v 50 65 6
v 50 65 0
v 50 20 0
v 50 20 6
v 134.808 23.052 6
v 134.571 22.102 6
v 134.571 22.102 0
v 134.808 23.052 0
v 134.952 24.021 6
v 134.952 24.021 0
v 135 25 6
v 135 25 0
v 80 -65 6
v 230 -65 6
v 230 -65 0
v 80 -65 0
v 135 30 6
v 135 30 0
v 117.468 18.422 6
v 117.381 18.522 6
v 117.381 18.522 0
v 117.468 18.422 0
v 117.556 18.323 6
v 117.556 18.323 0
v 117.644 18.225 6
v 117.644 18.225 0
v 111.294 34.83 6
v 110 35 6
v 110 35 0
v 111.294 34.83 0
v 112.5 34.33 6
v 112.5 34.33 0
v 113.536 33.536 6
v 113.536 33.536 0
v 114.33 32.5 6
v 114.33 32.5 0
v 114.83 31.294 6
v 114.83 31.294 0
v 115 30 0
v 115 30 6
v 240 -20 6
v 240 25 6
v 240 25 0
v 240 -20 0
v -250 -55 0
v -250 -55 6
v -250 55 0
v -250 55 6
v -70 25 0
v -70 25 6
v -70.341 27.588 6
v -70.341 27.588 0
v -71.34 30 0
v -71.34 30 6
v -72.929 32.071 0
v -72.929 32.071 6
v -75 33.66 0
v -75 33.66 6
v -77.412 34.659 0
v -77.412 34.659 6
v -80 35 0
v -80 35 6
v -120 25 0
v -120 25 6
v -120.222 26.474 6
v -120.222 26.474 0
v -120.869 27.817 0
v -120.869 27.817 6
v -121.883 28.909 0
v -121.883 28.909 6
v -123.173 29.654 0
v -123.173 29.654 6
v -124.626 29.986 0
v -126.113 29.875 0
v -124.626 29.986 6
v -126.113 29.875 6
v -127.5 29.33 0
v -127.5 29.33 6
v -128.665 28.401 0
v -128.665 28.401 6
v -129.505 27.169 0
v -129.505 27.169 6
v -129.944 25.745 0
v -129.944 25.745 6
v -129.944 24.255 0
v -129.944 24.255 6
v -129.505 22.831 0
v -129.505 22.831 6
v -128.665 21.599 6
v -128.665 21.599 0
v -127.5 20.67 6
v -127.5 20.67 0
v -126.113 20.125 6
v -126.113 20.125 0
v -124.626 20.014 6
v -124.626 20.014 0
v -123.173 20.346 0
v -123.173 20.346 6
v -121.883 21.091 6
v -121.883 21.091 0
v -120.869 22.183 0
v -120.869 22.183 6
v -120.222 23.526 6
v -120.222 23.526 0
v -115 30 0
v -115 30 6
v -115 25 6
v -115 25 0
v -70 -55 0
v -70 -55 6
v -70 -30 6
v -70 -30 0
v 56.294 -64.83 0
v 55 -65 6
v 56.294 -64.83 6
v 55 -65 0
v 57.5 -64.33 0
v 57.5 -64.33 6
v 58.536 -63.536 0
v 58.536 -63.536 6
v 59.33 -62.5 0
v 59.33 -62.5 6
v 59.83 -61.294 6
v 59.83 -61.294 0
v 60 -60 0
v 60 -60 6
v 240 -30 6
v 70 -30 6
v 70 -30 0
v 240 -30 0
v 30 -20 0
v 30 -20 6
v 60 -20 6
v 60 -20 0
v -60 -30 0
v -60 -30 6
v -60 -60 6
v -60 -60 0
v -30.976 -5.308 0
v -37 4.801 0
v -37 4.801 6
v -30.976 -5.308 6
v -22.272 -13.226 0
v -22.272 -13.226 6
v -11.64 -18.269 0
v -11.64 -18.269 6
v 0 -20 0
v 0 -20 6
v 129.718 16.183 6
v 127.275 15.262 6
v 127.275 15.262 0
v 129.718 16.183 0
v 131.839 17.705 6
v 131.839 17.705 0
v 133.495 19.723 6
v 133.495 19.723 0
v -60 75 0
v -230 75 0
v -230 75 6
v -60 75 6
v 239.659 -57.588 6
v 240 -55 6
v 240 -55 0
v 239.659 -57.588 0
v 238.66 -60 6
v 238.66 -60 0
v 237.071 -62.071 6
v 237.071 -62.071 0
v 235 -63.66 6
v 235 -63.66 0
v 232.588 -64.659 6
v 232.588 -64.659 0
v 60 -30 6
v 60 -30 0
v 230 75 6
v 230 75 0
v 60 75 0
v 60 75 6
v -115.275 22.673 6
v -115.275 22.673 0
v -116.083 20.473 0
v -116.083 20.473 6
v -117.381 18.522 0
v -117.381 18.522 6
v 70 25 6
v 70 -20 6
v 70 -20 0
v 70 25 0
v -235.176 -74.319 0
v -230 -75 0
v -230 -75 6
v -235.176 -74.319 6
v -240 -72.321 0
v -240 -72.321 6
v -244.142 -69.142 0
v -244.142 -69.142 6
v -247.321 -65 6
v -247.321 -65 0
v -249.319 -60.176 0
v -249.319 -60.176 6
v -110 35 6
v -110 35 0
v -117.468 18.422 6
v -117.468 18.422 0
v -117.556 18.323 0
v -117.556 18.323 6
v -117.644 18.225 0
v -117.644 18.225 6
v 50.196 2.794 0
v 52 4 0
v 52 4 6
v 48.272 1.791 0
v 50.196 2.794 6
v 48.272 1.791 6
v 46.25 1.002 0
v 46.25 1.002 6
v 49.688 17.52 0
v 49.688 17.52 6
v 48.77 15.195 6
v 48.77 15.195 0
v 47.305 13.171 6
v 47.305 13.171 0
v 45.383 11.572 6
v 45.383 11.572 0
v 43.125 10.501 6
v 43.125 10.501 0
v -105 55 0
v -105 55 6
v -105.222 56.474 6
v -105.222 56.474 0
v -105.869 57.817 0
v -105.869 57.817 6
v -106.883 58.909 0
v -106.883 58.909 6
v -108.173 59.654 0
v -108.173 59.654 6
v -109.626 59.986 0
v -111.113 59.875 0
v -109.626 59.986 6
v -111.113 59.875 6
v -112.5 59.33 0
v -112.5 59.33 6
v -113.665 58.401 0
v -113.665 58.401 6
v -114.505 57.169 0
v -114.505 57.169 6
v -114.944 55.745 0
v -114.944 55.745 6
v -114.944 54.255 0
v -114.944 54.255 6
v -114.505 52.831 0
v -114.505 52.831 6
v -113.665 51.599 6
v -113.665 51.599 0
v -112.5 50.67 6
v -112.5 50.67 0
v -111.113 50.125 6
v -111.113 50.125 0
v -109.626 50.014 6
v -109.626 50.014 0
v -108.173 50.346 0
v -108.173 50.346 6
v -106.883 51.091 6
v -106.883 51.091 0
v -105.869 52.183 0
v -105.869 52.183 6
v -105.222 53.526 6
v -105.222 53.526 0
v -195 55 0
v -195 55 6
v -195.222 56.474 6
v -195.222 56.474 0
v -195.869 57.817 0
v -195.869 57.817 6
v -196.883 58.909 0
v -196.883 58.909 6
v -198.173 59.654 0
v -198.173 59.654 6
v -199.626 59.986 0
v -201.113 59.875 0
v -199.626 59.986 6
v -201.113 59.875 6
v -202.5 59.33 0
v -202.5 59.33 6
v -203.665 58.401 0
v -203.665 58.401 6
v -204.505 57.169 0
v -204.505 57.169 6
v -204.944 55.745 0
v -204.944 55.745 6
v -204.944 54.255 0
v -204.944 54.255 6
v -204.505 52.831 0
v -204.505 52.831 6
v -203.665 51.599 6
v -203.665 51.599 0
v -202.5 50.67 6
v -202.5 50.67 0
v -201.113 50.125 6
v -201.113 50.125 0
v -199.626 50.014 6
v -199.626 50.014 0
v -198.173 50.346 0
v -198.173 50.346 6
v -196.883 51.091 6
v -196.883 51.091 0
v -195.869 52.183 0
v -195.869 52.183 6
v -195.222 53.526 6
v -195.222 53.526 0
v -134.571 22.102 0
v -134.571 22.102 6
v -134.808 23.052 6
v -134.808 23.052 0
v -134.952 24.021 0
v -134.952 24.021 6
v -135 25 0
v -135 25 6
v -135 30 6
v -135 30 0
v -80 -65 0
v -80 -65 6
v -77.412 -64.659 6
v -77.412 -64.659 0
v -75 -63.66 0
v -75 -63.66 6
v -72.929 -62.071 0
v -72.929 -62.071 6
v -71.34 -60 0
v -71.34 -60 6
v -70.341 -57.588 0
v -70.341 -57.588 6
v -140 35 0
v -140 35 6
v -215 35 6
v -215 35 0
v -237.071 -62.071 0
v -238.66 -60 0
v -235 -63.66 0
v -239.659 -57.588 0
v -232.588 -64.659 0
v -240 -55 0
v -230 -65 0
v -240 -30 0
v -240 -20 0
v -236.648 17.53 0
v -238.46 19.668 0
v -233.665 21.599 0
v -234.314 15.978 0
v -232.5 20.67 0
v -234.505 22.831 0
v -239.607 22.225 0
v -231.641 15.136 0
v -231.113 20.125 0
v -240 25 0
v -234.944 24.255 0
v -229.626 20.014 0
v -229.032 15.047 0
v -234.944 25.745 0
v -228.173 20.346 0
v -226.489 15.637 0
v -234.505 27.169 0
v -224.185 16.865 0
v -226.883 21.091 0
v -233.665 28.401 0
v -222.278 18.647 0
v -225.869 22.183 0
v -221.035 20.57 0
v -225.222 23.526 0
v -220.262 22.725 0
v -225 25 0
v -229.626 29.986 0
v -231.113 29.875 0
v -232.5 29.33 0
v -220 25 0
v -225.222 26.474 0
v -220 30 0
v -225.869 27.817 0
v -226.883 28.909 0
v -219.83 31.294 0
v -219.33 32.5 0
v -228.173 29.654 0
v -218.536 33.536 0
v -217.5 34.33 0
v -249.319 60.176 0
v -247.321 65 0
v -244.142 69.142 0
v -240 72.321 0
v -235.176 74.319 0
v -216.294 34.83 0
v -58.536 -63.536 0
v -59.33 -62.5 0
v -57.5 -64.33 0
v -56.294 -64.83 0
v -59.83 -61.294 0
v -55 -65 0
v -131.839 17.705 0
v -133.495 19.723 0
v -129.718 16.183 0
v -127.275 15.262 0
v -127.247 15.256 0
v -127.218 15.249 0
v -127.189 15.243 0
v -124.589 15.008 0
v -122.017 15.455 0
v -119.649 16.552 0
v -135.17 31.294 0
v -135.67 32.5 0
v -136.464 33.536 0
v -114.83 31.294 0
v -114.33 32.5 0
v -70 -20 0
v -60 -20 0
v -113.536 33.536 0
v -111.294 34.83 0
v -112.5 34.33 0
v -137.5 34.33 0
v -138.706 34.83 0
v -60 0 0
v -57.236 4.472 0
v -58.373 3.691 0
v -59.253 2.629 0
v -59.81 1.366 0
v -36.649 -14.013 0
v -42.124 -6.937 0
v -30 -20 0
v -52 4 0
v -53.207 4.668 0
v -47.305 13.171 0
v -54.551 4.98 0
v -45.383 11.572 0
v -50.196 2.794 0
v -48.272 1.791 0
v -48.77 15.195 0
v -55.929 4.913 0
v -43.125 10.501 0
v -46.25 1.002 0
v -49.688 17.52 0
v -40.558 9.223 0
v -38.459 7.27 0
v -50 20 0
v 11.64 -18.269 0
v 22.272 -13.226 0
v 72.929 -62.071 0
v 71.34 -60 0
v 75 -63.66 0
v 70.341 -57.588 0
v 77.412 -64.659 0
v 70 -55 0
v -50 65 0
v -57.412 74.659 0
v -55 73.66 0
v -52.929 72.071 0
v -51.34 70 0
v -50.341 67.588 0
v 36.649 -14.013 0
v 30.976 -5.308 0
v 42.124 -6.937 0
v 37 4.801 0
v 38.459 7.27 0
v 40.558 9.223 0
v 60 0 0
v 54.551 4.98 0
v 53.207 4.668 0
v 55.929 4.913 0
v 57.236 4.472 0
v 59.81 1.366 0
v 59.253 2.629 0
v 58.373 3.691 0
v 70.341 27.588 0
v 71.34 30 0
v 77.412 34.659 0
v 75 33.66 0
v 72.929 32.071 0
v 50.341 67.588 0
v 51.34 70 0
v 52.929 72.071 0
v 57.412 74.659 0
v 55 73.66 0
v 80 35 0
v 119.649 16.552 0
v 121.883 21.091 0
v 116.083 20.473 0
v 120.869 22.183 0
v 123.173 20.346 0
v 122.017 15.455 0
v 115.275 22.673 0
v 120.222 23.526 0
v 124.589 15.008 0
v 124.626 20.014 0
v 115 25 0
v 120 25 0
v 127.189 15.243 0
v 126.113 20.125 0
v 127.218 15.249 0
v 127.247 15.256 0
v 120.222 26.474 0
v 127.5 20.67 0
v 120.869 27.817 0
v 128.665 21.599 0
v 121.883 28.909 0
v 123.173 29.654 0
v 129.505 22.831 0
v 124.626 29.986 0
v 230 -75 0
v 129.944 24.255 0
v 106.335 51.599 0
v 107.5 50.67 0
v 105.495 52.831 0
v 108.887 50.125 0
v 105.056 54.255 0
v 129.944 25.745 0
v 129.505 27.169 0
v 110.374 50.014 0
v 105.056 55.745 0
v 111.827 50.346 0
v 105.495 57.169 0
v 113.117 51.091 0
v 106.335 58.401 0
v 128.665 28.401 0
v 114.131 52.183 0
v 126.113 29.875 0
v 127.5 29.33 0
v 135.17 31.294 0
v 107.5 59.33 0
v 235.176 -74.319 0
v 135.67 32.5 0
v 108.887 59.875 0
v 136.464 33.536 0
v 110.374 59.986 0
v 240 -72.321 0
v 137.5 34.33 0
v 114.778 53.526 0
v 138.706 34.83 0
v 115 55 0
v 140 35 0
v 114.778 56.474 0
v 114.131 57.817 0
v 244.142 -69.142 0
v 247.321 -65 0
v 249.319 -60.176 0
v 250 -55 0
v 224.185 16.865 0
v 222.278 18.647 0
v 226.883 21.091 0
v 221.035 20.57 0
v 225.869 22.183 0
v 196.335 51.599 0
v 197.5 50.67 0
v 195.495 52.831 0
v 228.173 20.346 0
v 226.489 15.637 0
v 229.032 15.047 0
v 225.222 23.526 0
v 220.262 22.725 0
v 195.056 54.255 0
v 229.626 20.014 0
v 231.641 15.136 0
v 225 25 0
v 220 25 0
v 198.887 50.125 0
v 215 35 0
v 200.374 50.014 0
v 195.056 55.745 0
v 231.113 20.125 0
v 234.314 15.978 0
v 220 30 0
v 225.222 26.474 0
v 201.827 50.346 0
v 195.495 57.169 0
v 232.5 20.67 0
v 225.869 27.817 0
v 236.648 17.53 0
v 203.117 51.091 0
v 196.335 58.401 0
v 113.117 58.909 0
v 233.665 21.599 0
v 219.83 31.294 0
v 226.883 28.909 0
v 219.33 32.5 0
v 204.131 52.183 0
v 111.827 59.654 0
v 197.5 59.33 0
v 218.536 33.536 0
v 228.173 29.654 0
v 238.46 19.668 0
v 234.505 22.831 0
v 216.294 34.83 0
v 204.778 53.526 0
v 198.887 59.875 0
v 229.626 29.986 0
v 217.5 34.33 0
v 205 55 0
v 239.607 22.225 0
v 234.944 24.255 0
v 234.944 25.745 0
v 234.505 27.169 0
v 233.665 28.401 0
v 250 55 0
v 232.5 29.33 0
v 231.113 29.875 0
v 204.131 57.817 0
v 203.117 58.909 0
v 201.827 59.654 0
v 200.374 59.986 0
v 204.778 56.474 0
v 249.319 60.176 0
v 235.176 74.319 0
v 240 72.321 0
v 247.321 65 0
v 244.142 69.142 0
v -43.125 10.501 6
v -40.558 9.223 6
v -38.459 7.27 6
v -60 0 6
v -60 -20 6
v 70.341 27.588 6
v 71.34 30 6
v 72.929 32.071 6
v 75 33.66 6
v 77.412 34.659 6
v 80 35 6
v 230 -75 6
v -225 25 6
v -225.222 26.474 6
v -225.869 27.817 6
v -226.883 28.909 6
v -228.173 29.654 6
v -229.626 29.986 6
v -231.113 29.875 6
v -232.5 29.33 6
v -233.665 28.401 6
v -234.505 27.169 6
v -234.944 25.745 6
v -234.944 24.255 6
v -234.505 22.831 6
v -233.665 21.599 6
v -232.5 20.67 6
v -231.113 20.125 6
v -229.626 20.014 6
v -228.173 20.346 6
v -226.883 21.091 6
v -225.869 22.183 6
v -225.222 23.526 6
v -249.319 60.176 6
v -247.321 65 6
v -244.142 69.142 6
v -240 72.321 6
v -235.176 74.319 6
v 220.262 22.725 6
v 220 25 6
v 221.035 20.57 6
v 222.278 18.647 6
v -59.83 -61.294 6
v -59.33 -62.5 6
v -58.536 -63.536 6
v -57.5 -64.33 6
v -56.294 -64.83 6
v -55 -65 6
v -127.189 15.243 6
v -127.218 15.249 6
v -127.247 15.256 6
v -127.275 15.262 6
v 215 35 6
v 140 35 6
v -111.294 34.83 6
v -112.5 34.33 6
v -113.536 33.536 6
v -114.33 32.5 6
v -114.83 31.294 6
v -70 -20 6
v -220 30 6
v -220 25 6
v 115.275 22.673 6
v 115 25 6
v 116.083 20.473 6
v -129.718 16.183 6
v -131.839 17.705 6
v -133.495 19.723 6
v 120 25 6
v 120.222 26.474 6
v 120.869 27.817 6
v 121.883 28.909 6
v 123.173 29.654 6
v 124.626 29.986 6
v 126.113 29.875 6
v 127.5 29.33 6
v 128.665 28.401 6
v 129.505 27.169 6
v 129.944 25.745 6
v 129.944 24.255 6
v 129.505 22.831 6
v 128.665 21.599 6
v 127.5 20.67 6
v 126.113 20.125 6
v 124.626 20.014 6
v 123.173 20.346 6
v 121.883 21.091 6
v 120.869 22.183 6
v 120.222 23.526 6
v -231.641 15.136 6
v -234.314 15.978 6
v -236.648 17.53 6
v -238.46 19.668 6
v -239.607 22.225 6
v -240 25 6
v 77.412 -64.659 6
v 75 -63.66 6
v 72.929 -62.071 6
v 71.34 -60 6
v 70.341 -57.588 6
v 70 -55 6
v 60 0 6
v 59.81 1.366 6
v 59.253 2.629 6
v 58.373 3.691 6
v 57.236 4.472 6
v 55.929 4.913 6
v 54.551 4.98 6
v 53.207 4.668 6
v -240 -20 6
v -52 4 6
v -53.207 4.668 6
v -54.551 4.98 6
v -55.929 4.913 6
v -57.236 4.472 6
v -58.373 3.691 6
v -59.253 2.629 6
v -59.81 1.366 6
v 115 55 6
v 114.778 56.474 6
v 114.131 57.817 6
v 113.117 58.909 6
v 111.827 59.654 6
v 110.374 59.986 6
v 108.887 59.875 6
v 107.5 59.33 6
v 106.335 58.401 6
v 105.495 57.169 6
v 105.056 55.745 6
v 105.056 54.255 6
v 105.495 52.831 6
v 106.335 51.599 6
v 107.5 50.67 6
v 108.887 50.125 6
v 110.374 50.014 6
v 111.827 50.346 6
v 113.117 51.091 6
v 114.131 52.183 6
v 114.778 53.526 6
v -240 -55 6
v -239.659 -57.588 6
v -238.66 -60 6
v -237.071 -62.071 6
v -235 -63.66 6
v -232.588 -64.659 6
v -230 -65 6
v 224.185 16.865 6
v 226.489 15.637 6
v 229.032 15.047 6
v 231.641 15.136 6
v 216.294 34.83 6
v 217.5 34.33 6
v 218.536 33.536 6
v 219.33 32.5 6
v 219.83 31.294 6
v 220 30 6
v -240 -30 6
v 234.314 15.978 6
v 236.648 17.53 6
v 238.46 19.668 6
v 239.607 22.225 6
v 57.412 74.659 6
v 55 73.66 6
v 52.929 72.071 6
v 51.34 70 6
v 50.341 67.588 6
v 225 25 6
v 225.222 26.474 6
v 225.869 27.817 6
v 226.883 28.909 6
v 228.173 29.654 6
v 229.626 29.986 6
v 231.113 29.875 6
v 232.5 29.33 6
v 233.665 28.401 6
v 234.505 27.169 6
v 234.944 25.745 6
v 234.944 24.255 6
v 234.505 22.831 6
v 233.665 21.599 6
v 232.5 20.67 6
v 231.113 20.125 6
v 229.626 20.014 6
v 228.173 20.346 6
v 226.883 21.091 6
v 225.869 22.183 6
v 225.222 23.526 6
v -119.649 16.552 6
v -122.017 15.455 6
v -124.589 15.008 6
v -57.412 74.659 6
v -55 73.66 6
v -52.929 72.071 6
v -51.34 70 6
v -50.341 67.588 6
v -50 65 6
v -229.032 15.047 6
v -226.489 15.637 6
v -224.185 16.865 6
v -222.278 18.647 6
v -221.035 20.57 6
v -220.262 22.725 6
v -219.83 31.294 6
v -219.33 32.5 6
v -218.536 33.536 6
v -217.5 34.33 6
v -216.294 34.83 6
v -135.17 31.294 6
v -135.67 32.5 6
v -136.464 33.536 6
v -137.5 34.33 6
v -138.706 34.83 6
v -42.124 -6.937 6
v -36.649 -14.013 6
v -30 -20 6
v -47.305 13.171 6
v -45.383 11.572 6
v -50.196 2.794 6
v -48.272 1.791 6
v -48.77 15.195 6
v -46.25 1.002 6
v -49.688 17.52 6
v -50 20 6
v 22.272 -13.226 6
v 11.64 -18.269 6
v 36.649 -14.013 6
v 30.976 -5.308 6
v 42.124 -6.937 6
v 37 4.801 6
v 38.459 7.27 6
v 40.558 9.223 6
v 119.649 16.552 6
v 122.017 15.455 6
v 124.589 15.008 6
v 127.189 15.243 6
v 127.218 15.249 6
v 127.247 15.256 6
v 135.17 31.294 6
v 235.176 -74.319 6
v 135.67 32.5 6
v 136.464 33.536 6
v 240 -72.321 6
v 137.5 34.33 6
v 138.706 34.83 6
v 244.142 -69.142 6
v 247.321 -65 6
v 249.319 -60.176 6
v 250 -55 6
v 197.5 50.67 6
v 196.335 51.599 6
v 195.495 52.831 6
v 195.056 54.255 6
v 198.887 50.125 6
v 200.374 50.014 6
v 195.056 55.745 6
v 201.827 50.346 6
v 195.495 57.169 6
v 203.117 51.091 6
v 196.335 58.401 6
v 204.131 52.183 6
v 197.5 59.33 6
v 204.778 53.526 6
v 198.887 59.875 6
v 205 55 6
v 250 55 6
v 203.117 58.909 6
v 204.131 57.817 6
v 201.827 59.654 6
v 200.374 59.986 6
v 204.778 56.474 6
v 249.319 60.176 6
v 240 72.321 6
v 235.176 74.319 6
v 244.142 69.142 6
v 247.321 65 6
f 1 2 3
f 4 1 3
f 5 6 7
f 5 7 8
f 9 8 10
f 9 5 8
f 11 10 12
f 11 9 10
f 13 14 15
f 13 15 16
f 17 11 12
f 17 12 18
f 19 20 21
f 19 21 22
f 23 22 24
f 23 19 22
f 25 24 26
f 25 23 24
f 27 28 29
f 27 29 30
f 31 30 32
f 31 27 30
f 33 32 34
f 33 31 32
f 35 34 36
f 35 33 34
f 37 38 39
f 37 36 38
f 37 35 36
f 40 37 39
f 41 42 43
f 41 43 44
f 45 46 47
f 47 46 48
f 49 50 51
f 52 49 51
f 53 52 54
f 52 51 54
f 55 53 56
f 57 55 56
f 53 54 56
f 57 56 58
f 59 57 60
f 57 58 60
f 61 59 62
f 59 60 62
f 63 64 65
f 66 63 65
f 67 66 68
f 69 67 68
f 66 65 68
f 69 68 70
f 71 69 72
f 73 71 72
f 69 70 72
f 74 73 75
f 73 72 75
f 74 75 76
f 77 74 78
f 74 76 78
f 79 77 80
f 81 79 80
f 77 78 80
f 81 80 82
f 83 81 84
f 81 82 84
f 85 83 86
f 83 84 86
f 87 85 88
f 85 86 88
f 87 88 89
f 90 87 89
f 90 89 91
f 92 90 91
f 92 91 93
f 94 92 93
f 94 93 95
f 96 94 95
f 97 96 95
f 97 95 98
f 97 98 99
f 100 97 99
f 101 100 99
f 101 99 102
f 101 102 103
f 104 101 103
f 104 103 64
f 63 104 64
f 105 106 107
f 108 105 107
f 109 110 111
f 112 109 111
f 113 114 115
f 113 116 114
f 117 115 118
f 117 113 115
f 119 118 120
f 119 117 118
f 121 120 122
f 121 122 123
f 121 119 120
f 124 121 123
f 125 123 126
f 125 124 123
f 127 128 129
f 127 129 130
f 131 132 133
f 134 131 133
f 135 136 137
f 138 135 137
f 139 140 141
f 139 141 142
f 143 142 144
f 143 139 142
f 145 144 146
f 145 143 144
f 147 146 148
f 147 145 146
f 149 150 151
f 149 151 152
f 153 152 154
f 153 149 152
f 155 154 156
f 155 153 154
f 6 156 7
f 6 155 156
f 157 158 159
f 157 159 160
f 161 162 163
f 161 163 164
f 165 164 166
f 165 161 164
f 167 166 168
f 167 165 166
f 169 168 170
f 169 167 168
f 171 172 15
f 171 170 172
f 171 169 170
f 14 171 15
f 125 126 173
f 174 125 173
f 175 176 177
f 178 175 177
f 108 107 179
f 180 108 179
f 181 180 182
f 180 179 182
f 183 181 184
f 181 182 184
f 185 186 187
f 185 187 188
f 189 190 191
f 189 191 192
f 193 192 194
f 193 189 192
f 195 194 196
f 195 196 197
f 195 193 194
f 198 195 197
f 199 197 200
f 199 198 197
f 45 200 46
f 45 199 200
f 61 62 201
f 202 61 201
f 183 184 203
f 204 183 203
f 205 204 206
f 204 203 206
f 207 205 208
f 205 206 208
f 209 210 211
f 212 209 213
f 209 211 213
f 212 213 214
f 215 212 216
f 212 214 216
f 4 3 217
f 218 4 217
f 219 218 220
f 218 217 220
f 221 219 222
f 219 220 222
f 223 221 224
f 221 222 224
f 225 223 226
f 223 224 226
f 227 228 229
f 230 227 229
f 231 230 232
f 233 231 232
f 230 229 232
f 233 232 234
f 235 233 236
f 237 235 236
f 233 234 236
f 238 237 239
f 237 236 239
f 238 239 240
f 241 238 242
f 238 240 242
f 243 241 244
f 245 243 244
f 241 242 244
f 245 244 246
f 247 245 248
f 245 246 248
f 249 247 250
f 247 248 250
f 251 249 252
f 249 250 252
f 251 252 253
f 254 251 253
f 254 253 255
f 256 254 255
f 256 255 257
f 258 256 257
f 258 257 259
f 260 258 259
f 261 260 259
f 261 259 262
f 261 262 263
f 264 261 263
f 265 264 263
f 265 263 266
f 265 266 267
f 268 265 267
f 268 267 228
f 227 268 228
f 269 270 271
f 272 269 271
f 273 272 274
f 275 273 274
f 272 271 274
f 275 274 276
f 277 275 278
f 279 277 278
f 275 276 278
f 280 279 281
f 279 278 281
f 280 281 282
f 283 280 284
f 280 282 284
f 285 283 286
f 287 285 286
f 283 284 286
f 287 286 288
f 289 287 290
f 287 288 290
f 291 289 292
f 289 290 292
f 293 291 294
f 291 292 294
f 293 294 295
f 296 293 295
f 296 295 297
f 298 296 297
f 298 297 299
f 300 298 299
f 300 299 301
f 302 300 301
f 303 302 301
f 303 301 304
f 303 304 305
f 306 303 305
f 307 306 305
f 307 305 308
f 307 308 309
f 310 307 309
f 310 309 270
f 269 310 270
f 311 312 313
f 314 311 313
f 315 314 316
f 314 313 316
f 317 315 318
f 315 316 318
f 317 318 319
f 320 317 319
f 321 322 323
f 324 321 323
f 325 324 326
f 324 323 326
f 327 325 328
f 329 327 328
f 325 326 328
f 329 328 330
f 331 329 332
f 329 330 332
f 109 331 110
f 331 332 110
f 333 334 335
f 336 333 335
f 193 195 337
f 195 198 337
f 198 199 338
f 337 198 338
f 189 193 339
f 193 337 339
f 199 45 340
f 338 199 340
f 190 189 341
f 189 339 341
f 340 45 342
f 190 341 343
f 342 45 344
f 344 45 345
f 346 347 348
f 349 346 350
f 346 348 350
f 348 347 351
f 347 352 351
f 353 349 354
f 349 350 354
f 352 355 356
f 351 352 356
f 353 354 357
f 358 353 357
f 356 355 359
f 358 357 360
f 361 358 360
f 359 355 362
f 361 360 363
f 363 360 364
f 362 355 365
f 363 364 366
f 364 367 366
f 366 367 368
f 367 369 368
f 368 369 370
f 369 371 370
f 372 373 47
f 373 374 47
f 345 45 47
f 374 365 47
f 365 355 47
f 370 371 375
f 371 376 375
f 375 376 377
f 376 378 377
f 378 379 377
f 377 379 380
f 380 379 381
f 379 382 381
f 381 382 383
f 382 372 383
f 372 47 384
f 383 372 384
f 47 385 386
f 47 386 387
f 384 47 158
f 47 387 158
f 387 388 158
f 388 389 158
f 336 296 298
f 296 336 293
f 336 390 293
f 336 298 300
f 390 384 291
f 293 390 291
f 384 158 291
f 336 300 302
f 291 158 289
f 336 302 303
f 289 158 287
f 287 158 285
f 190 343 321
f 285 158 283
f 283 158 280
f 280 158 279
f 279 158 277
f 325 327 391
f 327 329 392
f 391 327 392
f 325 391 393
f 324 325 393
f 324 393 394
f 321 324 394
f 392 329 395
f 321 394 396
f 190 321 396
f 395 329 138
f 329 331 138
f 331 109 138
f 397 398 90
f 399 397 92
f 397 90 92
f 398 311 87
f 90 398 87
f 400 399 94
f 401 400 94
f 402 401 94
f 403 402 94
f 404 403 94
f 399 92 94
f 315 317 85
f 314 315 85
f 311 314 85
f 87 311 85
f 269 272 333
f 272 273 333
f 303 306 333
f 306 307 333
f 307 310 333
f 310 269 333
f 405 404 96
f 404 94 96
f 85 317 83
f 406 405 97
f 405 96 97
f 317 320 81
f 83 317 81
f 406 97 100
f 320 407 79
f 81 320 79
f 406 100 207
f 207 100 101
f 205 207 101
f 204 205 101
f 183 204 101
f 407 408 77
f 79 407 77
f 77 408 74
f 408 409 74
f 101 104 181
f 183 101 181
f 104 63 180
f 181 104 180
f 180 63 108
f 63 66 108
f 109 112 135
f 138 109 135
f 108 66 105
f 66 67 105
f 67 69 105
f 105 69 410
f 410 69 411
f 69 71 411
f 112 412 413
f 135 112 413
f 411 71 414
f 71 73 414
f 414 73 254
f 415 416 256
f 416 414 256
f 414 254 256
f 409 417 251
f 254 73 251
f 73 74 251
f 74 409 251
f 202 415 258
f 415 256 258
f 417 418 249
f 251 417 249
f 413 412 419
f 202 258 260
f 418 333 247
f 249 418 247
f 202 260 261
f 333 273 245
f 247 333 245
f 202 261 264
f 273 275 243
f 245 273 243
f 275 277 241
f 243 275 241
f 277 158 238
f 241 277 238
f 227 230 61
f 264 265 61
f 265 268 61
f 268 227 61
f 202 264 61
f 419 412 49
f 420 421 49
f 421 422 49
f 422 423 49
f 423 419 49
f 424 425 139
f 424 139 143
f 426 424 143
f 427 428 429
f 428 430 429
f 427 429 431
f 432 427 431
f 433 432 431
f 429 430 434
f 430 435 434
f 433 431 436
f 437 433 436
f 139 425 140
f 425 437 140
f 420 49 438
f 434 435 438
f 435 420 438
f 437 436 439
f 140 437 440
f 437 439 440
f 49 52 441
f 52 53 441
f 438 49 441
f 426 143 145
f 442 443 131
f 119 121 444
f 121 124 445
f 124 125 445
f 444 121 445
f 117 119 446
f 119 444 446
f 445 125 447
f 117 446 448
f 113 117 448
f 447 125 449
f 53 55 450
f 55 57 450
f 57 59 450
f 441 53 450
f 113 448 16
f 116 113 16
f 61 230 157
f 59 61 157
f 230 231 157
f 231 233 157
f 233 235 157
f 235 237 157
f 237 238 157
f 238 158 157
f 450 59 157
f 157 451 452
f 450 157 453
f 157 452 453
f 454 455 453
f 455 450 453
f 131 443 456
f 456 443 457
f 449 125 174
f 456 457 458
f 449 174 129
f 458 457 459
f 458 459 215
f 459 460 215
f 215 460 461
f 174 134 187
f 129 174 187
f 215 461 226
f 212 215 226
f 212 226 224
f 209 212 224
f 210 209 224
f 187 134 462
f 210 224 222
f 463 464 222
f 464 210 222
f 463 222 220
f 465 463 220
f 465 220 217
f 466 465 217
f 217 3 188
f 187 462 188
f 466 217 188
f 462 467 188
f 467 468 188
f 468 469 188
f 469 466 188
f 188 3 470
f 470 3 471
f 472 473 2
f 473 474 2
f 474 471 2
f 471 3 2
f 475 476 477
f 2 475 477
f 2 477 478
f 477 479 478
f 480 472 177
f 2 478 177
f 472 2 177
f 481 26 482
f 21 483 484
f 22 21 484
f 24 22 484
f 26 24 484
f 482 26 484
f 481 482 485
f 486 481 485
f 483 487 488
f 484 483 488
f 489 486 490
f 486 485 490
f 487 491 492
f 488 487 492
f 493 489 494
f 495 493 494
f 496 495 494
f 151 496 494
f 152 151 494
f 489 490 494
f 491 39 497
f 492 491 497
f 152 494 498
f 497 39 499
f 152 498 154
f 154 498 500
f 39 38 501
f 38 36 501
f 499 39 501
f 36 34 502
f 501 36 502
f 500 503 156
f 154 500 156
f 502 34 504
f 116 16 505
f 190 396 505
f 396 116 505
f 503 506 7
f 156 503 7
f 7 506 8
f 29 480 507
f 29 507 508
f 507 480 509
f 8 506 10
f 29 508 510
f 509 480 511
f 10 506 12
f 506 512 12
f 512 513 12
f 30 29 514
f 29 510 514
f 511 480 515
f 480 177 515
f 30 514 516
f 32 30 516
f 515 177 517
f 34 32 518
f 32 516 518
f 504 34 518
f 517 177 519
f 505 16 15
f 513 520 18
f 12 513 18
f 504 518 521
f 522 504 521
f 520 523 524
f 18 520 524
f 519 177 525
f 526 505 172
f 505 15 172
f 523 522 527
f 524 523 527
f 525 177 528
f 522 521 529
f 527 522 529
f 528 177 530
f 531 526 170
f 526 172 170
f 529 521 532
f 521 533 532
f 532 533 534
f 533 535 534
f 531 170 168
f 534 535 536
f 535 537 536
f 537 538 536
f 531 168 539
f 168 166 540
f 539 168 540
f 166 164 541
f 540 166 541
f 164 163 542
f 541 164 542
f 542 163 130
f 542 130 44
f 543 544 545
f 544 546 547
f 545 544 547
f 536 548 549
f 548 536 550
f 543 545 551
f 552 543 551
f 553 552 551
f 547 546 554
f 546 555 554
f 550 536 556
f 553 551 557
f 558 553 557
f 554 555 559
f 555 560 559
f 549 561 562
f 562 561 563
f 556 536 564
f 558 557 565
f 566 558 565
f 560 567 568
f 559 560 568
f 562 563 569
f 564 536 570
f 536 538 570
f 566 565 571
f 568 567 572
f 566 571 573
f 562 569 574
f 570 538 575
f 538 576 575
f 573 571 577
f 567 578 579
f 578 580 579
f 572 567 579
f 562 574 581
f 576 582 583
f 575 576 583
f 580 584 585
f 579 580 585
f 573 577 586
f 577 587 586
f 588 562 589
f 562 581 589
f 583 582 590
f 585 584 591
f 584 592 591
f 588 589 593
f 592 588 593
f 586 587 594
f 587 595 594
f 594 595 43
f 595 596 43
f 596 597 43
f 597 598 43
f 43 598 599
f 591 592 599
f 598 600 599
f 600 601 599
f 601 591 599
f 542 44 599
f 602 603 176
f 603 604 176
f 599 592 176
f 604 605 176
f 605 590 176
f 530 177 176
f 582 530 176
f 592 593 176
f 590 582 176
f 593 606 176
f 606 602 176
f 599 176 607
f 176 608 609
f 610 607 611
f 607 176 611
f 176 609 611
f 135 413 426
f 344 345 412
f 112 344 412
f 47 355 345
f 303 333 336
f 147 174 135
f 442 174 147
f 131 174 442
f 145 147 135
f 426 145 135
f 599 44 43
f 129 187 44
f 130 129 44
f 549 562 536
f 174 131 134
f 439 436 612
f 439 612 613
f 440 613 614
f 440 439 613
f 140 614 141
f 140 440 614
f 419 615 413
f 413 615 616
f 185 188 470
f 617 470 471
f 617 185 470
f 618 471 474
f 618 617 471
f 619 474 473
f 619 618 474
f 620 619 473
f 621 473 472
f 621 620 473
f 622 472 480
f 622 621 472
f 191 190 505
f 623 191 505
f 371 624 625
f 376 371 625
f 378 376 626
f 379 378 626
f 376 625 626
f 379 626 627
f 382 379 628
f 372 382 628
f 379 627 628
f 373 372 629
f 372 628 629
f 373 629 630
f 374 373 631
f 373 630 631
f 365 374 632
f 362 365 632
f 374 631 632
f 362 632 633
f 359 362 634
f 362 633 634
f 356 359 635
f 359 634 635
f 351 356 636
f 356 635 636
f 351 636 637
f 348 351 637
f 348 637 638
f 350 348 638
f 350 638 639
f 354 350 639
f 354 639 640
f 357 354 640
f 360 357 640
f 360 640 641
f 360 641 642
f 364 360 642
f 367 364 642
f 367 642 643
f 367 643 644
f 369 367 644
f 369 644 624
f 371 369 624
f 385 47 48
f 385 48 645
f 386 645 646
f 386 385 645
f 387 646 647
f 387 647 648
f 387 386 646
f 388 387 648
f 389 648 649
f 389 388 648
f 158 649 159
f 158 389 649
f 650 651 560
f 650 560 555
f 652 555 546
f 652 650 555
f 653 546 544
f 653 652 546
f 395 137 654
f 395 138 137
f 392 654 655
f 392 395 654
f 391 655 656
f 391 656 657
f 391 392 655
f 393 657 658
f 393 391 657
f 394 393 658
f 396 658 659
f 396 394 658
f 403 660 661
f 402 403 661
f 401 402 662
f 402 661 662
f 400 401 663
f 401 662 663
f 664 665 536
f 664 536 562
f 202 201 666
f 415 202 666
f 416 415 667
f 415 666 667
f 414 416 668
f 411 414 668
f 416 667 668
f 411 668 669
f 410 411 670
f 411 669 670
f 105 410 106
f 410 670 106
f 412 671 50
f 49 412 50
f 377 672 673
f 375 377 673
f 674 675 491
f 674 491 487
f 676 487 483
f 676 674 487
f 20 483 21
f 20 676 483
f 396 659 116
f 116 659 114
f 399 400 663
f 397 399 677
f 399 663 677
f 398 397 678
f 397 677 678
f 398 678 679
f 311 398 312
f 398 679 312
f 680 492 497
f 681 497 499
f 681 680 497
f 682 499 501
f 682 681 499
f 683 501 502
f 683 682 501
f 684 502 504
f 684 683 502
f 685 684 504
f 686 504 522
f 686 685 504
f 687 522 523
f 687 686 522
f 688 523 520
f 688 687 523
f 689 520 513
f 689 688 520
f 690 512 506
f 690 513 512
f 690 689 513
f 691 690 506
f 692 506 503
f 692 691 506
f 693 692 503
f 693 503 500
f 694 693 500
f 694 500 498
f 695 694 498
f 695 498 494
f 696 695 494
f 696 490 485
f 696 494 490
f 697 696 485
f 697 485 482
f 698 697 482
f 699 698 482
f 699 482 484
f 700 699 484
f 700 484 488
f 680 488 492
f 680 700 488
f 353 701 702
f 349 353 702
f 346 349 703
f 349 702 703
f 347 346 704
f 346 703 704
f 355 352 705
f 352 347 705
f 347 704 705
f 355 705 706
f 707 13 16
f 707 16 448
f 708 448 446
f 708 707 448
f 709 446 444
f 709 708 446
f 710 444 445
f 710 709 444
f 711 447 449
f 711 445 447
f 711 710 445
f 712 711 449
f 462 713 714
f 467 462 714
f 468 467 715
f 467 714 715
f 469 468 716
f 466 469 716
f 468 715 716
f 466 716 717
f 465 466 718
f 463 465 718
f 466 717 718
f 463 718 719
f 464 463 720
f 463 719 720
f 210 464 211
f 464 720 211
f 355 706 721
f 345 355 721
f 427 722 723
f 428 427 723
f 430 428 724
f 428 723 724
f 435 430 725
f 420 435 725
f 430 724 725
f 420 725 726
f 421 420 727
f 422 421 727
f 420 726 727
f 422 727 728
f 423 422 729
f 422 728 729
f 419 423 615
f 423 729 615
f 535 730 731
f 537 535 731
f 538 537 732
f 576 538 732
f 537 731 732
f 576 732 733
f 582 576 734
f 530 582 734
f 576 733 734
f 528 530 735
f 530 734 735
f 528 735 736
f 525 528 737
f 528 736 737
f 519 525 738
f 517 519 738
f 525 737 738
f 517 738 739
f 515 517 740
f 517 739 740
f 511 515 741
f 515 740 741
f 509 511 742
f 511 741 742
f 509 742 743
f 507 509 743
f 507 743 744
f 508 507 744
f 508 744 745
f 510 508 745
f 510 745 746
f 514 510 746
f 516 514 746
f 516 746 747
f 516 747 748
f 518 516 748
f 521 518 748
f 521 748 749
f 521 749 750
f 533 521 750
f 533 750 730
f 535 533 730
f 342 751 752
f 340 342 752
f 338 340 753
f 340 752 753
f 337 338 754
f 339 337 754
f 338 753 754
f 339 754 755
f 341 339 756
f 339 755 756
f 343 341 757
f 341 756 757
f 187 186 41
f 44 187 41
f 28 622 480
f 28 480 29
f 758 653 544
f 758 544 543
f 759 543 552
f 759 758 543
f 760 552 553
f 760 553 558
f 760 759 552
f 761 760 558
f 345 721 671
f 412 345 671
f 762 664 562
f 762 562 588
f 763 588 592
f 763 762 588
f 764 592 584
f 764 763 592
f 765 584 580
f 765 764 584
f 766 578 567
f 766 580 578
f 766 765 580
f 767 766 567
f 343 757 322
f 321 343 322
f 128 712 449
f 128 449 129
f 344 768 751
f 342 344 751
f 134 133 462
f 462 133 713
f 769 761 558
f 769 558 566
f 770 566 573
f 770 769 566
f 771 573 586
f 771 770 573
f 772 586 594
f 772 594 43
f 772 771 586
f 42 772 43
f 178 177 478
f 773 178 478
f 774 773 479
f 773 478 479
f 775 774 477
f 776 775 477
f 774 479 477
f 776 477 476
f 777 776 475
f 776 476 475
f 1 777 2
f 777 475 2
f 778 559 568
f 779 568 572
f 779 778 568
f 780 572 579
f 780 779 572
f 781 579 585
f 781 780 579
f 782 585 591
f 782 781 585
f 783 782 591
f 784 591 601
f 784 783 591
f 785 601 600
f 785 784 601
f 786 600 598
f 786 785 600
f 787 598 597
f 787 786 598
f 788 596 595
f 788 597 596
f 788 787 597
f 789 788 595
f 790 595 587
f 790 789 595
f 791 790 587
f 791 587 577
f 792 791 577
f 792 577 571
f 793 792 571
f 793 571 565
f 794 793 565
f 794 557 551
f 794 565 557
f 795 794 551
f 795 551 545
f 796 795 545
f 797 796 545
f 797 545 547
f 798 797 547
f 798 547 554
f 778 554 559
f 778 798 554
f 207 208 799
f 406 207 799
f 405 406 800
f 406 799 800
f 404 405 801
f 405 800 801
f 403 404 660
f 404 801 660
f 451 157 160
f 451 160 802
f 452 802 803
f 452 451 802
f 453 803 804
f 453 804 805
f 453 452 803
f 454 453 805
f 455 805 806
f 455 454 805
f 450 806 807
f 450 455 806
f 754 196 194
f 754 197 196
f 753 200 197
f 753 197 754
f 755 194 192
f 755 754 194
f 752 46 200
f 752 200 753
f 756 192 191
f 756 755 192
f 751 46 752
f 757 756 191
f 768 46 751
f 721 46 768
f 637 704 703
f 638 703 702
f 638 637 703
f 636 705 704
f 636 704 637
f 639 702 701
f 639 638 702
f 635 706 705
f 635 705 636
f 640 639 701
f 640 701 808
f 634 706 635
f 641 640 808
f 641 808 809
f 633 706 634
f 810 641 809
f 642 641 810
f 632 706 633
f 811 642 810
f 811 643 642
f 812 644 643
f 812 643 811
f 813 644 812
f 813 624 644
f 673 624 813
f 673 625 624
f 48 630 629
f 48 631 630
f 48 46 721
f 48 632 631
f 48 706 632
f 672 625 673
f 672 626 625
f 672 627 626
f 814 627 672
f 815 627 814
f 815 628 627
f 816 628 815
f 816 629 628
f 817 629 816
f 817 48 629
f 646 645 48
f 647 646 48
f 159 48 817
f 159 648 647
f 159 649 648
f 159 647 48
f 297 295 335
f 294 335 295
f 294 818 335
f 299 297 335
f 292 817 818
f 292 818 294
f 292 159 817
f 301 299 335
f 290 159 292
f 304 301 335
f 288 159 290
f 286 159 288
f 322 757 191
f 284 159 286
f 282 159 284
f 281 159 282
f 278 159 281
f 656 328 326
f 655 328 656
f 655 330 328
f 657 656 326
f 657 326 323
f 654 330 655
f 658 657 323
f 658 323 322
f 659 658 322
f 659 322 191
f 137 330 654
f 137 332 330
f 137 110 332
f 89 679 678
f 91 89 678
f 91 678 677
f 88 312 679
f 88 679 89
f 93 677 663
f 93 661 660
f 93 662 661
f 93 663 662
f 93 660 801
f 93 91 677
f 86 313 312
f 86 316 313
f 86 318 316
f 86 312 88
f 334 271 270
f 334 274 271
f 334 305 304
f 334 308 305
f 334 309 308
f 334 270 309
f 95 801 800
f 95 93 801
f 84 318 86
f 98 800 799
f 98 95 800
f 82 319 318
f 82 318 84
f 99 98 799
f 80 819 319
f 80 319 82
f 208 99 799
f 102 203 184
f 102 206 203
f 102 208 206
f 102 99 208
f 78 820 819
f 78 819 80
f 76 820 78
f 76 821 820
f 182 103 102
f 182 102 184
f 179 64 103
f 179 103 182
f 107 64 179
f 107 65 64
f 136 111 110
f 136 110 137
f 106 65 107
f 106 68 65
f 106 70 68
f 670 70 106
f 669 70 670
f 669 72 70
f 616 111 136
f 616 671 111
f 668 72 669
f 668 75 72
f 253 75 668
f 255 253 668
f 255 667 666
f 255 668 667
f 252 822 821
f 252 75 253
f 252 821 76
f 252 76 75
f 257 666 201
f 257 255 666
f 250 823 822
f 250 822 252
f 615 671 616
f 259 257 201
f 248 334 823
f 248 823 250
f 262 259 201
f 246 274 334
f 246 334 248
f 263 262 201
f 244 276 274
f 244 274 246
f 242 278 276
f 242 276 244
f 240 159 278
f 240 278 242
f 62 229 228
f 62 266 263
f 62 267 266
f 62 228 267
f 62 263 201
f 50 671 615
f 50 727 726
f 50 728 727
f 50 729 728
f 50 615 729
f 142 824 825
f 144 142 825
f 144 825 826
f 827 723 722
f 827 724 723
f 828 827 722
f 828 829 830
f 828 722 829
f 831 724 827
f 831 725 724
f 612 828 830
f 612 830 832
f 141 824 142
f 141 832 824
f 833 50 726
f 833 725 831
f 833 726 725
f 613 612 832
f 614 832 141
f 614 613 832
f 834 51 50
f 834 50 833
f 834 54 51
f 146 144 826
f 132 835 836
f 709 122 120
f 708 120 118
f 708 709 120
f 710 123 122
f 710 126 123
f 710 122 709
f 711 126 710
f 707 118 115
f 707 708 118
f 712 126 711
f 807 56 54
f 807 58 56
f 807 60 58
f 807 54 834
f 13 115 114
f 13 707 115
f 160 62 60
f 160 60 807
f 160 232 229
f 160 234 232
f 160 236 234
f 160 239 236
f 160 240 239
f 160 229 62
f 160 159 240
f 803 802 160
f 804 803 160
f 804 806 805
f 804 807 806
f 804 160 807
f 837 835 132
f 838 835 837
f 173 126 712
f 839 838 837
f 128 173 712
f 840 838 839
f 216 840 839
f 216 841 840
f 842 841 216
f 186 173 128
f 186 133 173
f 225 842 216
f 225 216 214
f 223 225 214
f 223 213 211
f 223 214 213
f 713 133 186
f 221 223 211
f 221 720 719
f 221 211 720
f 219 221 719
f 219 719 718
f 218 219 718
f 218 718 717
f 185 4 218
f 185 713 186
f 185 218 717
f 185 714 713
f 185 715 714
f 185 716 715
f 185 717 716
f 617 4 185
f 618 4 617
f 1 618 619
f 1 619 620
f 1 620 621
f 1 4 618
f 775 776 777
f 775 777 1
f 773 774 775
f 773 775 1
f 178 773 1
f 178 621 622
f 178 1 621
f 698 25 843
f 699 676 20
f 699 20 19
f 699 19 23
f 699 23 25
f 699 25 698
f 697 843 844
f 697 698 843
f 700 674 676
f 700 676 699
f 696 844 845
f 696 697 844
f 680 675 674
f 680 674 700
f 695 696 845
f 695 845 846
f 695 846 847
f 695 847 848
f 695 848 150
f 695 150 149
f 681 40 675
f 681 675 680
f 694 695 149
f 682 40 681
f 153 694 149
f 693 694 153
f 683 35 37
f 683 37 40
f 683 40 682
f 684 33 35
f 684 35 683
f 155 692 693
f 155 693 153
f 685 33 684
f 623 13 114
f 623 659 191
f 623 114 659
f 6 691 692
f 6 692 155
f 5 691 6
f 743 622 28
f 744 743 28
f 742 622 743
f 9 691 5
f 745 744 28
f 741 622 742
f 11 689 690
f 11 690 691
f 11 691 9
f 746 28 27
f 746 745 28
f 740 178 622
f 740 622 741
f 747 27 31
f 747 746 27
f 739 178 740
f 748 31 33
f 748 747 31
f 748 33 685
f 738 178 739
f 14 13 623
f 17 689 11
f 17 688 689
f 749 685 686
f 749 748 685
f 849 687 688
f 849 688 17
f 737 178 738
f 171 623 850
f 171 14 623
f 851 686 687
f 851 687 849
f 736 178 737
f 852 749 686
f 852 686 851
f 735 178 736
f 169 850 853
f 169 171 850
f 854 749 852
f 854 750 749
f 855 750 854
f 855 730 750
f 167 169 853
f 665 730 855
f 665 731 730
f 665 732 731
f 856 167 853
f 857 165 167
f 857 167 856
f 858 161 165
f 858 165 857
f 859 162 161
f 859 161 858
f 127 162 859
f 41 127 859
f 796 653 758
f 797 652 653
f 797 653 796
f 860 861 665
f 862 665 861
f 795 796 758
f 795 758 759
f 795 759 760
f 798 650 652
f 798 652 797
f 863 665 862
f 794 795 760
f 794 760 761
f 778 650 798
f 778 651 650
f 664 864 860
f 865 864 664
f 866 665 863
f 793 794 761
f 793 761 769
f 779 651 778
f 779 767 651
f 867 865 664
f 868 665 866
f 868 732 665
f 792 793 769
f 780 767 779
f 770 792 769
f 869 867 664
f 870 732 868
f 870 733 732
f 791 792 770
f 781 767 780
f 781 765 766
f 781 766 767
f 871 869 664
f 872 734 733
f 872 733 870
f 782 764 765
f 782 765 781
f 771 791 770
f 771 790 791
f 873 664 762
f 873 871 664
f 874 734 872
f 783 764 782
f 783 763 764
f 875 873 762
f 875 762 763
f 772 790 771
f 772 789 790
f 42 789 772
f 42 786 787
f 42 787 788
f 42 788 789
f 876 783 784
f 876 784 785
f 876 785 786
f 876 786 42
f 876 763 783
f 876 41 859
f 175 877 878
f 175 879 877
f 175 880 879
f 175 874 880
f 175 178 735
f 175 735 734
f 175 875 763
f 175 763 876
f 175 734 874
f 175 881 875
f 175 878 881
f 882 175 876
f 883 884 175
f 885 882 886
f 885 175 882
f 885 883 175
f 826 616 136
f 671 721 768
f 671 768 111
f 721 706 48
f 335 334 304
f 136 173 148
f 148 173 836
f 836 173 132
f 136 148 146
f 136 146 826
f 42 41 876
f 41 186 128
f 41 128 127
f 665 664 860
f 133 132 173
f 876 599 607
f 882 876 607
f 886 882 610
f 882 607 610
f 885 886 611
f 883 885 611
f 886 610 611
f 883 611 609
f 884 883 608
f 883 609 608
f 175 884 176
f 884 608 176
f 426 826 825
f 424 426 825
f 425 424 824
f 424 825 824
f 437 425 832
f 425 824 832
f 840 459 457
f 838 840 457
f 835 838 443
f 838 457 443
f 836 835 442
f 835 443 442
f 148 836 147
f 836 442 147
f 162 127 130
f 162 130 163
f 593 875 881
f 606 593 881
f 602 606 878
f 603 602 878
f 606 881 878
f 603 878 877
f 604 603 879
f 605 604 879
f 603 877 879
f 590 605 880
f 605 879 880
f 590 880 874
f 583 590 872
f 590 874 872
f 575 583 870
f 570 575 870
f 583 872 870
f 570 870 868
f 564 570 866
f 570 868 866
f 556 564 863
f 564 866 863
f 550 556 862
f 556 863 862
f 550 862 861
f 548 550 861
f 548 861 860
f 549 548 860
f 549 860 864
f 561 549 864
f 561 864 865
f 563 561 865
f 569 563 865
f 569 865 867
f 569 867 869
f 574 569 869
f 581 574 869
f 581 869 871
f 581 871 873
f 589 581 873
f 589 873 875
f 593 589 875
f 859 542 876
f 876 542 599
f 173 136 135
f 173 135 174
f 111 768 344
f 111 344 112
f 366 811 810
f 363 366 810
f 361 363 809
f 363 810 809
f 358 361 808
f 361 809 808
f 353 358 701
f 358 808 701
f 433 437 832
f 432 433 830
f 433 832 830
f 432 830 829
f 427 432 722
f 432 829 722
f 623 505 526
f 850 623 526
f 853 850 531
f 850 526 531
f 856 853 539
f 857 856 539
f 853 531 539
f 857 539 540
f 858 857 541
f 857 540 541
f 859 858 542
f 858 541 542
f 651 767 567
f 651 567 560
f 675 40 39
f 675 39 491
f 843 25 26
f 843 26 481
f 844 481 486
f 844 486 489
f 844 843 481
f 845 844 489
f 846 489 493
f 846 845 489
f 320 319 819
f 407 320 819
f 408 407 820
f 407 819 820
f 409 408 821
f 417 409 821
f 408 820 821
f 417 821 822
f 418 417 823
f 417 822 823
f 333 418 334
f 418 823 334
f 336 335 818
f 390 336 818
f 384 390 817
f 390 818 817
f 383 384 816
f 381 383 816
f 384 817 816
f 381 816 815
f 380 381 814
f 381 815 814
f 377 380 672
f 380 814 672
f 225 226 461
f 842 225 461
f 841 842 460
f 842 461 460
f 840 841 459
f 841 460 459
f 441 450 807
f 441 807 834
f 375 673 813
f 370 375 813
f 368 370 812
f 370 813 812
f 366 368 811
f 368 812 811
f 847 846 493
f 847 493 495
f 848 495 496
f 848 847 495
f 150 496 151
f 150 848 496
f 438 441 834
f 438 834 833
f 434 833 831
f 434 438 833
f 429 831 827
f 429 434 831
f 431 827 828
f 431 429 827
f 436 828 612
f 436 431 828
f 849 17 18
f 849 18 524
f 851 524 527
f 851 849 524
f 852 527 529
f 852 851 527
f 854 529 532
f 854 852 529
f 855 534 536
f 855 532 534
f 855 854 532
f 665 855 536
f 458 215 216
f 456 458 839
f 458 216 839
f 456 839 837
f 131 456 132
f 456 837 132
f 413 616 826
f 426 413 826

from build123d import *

# Parameters (mm, degrees)
BOSS_EXTRUDE1_DEPTH = 6
SKETCH3_R           = 5
CUT_EXTRUDE1_DEPTH  = 262.076617107
SKETCH4_R           = 5
CUT_EXTRUDE2_DEPTH  = 262.076617107
CUT_EXTRUDE5_DEPTH  = 262.076617107
FILLET5_R           = 5
FILLET6_R           = 5
SKETCH9_W           = 500
SKETCH9_H           = 10
BOSS_EXTRUDE2_DEPTH = 6


with BuildPart() as part:
    # Sketch1 → Boss-Extrude1 (new body)
    with BuildSketch(Plane.XY):
        with BuildLine():
            Line((-250, -55), (-250, 3.178280867))
            Line((-250, 3.178280867), (-250, 55))
            ThreePointArc((-250, 55), (-244.142135624, 69.142135624), (-230, 75))
            Line((-230, 75), (-220, 75))
            Line((-220, 75), (-164.330865428, 75))
            Line((-164.330865428, 75), (-60, 75))
            ThreePointArc((-60, 75), (-52.928932188, 72.071067812), (-50, 65))
            Line((-50, 65), (-50, 20))
            ThreePointArc((-50, 20), (-48.100925873, 14.1369803), (-43.125, 10.500822404))
            ThreePointArc((-43.125, 10.500822404), (-39.437786703, 8.32242004), (-37, 4.801315846))
            ThreePointArc((-37, 4.801315846), (-22.271648276, -13.226099426), (0, -20))
            Line((0, -20), (0, -40))
            Line((0, -40), (0, -65))
            Line((0, -65), (0, -75))
            Line((0, -75), (-230, -75))
            ThreePointArc((-230, -75), (-244.142135624, -69.142135624), (-250, -55))
        make_face()
    boss_extrude1 = extrude(amount=BOSS_EXTRUDE1_DEPTH)

    # Mirror1: Boss-Extrude1 across plane
    add(boss_extrude1.mirror(Plane(origin=(0, -20, 6), x_dir=(0, 0, 1), z_dir=(-1, 0, 0))))

    # Sketch3 → Cut-Extrude1 (cut, through all)
    with BuildSketch(Plane.XY.offset(6)):
        with Locations((110, 55)):
            Circle(SKETCH3_R)
        with Locations((200, 55)):
            Circle(SKETCH3_R)
        with Locations((-110, 55)):
            Circle(SKETCH3_R)
        with Locations((-200, 55)):
            Circle(SKETCH3_R)
    extrude(amount=-CUT_EXTRUDE1_DEPTH, mode=Mode.SUBTRACT)

    # Sketch4 → Cut-Extrude2 (cut, through all)
    with BuildSketch(Plane.XY.offset(6)):
        with BuildLine():
            Line((-70, -55), (-70, 25))
            ThreePointArc((-70, 25), (-72.928932188, 32.071067812), (-80, 35))
            Line((-80, 35), (-110, 35))
            ThreePointArc((-110, 35), (-113.535533906, 33.535533906), (-115, 30))
            Line((-115, 30), (-115, 25))
            ThreePointArc((-115, 25), (-115.614239502, 21.549275456), (-117.381499976, 18.522465177))
            ThreePointArc((-117.381499976, 18.522465177), (-117.5115076, 18.372596167), (-117.644462896, 18.225335882))
            ThreePointArc((-117.644462896, 18.225335882), (-122.017250069, 15.45520022), (-127.189262676, 15.242585951))
            ThreePointArc((-127.189262676, 15.242585951), (-127.232362089, 15.252356208), (-127.275417902, 15.262316838))
            ThreePointArc((-127.275417902, 15.262316838), (-131.839411289, 17.704627959), (-134.570789944, 22.101728126))
            ThreePointArc((-134.570789944, 22.101728126), (-134.892115533, 23.535059632), (-135, 25))
            Line((-135, 25), (-135, 30))
            ThreePointArc((-135, 30), (-136.464466094, 33.535533906), (-140, 35))
            Line((-140, 35), (-215, 35))
            ThreePointArc((-215, 35), (-218.535533906, 33.535533906), (-220, 30))
            Line((-220, 30), (-220, 25))
            ThreePointArc((-220, 25), (-220.586588267, 21.625436392), (-222.277535909, 18.646768667))
            ThreePointArc((-222.277535909, 18.646768667), (-226.488765584, 15.636708224), (-231.640827685, 15.135534251))
            ThreePointArc((-231.640827685, 15.135534251), (-237.629163678, 18.535028107), (-240, 25))
            Line((-240, 25), (-240, -55))
            ThreePointArc((-240, -55), (-237.071067812, -62.071067812), (-230, -65))
            Line((-230, -65), (-210, -65))
            Line((-210, -65), (-190, -65))
            Line((-190, -65), (-110, -65))
            Line((-110, -65), (-90, -65))
            Line((-90, -65), (-80, -65))
            ThreePointArc((-80, -65), (-72.928932188, -62.071067812), (-70, -55))
        make_face()
        with Locations((-230, 25)):
            Circle(SKETCH4_R)
        with Locations((-125, 25)):
            Circle(SKETCH4_R)
    cut_extrude2 = extrude(amount=-CUT_EXTRUDE2_DEPTH, mode=Mode.SUBTRACT)

    # Sketch8 → Cut-Extrude5 (cut, through all)
    with BuildSketch(Plane.XY.offset(6)):
        with BuildLine():
            Line((-60, 0), (-60, -65))
            Line((-60, -65), (60, -65))
            Line((60, -65), (60, 0))
            ThreePointArc((60, 0), (57.236067977, 4.472135955), (52, 4))
            ThreePointArc((52, 4), (49.247332505, 2.266223145), (46.25, 1.001644808))
            ThreePointArc((46.25, 1.001644808), (0, -30), (-46.25, 1.001644808))
            ThreePointArc((-46.25, 1.001644808), (-49.247332505, 2.266223145), (-52, 4))
            ThreePointArc((-52, 4), (-57.236067977, 4.472135955), (-60, 0))
        make_face()
    extrude(amount=-CUT_EXTRUDE5_DEPTH, mode=Mode.SUBTRACT)

    # Fillet5
    fillet5_edges = [part.edges().sort_by_distance(p)[0] for p in [
        (-60, -65, 3),
    ]]
    fillet(fillet5_edges, radius=FILLET5_R)

    # Fillet6
    fillet6_edges = [part.edges().sort_by_distance(p)[0] for p in [
        (60, -65, 3),
    ]]
    fillet(fillet6_edges, radius=FILLET6_R)

    # Mirror2: Cut-Extrude2 across plane
    add(cut_extrude2.mirror(Plane(origin=(0, 0, 0), x_dir=(0, 0, 1), z_dir=(1, 0, 0))), mode=Mode.SUBTRACT)

    # Sketch9 → Boss-Extrude2 (add)
    with BuildSketch(Plane.XY.offset(6)):
        with Locations((0, -25)):
            Rectangle(SKETCH9_W, SKETCH9_H)
    extrude(amount=-BOSS_EXTRUDE2_DEPTH)


solid = part.part
